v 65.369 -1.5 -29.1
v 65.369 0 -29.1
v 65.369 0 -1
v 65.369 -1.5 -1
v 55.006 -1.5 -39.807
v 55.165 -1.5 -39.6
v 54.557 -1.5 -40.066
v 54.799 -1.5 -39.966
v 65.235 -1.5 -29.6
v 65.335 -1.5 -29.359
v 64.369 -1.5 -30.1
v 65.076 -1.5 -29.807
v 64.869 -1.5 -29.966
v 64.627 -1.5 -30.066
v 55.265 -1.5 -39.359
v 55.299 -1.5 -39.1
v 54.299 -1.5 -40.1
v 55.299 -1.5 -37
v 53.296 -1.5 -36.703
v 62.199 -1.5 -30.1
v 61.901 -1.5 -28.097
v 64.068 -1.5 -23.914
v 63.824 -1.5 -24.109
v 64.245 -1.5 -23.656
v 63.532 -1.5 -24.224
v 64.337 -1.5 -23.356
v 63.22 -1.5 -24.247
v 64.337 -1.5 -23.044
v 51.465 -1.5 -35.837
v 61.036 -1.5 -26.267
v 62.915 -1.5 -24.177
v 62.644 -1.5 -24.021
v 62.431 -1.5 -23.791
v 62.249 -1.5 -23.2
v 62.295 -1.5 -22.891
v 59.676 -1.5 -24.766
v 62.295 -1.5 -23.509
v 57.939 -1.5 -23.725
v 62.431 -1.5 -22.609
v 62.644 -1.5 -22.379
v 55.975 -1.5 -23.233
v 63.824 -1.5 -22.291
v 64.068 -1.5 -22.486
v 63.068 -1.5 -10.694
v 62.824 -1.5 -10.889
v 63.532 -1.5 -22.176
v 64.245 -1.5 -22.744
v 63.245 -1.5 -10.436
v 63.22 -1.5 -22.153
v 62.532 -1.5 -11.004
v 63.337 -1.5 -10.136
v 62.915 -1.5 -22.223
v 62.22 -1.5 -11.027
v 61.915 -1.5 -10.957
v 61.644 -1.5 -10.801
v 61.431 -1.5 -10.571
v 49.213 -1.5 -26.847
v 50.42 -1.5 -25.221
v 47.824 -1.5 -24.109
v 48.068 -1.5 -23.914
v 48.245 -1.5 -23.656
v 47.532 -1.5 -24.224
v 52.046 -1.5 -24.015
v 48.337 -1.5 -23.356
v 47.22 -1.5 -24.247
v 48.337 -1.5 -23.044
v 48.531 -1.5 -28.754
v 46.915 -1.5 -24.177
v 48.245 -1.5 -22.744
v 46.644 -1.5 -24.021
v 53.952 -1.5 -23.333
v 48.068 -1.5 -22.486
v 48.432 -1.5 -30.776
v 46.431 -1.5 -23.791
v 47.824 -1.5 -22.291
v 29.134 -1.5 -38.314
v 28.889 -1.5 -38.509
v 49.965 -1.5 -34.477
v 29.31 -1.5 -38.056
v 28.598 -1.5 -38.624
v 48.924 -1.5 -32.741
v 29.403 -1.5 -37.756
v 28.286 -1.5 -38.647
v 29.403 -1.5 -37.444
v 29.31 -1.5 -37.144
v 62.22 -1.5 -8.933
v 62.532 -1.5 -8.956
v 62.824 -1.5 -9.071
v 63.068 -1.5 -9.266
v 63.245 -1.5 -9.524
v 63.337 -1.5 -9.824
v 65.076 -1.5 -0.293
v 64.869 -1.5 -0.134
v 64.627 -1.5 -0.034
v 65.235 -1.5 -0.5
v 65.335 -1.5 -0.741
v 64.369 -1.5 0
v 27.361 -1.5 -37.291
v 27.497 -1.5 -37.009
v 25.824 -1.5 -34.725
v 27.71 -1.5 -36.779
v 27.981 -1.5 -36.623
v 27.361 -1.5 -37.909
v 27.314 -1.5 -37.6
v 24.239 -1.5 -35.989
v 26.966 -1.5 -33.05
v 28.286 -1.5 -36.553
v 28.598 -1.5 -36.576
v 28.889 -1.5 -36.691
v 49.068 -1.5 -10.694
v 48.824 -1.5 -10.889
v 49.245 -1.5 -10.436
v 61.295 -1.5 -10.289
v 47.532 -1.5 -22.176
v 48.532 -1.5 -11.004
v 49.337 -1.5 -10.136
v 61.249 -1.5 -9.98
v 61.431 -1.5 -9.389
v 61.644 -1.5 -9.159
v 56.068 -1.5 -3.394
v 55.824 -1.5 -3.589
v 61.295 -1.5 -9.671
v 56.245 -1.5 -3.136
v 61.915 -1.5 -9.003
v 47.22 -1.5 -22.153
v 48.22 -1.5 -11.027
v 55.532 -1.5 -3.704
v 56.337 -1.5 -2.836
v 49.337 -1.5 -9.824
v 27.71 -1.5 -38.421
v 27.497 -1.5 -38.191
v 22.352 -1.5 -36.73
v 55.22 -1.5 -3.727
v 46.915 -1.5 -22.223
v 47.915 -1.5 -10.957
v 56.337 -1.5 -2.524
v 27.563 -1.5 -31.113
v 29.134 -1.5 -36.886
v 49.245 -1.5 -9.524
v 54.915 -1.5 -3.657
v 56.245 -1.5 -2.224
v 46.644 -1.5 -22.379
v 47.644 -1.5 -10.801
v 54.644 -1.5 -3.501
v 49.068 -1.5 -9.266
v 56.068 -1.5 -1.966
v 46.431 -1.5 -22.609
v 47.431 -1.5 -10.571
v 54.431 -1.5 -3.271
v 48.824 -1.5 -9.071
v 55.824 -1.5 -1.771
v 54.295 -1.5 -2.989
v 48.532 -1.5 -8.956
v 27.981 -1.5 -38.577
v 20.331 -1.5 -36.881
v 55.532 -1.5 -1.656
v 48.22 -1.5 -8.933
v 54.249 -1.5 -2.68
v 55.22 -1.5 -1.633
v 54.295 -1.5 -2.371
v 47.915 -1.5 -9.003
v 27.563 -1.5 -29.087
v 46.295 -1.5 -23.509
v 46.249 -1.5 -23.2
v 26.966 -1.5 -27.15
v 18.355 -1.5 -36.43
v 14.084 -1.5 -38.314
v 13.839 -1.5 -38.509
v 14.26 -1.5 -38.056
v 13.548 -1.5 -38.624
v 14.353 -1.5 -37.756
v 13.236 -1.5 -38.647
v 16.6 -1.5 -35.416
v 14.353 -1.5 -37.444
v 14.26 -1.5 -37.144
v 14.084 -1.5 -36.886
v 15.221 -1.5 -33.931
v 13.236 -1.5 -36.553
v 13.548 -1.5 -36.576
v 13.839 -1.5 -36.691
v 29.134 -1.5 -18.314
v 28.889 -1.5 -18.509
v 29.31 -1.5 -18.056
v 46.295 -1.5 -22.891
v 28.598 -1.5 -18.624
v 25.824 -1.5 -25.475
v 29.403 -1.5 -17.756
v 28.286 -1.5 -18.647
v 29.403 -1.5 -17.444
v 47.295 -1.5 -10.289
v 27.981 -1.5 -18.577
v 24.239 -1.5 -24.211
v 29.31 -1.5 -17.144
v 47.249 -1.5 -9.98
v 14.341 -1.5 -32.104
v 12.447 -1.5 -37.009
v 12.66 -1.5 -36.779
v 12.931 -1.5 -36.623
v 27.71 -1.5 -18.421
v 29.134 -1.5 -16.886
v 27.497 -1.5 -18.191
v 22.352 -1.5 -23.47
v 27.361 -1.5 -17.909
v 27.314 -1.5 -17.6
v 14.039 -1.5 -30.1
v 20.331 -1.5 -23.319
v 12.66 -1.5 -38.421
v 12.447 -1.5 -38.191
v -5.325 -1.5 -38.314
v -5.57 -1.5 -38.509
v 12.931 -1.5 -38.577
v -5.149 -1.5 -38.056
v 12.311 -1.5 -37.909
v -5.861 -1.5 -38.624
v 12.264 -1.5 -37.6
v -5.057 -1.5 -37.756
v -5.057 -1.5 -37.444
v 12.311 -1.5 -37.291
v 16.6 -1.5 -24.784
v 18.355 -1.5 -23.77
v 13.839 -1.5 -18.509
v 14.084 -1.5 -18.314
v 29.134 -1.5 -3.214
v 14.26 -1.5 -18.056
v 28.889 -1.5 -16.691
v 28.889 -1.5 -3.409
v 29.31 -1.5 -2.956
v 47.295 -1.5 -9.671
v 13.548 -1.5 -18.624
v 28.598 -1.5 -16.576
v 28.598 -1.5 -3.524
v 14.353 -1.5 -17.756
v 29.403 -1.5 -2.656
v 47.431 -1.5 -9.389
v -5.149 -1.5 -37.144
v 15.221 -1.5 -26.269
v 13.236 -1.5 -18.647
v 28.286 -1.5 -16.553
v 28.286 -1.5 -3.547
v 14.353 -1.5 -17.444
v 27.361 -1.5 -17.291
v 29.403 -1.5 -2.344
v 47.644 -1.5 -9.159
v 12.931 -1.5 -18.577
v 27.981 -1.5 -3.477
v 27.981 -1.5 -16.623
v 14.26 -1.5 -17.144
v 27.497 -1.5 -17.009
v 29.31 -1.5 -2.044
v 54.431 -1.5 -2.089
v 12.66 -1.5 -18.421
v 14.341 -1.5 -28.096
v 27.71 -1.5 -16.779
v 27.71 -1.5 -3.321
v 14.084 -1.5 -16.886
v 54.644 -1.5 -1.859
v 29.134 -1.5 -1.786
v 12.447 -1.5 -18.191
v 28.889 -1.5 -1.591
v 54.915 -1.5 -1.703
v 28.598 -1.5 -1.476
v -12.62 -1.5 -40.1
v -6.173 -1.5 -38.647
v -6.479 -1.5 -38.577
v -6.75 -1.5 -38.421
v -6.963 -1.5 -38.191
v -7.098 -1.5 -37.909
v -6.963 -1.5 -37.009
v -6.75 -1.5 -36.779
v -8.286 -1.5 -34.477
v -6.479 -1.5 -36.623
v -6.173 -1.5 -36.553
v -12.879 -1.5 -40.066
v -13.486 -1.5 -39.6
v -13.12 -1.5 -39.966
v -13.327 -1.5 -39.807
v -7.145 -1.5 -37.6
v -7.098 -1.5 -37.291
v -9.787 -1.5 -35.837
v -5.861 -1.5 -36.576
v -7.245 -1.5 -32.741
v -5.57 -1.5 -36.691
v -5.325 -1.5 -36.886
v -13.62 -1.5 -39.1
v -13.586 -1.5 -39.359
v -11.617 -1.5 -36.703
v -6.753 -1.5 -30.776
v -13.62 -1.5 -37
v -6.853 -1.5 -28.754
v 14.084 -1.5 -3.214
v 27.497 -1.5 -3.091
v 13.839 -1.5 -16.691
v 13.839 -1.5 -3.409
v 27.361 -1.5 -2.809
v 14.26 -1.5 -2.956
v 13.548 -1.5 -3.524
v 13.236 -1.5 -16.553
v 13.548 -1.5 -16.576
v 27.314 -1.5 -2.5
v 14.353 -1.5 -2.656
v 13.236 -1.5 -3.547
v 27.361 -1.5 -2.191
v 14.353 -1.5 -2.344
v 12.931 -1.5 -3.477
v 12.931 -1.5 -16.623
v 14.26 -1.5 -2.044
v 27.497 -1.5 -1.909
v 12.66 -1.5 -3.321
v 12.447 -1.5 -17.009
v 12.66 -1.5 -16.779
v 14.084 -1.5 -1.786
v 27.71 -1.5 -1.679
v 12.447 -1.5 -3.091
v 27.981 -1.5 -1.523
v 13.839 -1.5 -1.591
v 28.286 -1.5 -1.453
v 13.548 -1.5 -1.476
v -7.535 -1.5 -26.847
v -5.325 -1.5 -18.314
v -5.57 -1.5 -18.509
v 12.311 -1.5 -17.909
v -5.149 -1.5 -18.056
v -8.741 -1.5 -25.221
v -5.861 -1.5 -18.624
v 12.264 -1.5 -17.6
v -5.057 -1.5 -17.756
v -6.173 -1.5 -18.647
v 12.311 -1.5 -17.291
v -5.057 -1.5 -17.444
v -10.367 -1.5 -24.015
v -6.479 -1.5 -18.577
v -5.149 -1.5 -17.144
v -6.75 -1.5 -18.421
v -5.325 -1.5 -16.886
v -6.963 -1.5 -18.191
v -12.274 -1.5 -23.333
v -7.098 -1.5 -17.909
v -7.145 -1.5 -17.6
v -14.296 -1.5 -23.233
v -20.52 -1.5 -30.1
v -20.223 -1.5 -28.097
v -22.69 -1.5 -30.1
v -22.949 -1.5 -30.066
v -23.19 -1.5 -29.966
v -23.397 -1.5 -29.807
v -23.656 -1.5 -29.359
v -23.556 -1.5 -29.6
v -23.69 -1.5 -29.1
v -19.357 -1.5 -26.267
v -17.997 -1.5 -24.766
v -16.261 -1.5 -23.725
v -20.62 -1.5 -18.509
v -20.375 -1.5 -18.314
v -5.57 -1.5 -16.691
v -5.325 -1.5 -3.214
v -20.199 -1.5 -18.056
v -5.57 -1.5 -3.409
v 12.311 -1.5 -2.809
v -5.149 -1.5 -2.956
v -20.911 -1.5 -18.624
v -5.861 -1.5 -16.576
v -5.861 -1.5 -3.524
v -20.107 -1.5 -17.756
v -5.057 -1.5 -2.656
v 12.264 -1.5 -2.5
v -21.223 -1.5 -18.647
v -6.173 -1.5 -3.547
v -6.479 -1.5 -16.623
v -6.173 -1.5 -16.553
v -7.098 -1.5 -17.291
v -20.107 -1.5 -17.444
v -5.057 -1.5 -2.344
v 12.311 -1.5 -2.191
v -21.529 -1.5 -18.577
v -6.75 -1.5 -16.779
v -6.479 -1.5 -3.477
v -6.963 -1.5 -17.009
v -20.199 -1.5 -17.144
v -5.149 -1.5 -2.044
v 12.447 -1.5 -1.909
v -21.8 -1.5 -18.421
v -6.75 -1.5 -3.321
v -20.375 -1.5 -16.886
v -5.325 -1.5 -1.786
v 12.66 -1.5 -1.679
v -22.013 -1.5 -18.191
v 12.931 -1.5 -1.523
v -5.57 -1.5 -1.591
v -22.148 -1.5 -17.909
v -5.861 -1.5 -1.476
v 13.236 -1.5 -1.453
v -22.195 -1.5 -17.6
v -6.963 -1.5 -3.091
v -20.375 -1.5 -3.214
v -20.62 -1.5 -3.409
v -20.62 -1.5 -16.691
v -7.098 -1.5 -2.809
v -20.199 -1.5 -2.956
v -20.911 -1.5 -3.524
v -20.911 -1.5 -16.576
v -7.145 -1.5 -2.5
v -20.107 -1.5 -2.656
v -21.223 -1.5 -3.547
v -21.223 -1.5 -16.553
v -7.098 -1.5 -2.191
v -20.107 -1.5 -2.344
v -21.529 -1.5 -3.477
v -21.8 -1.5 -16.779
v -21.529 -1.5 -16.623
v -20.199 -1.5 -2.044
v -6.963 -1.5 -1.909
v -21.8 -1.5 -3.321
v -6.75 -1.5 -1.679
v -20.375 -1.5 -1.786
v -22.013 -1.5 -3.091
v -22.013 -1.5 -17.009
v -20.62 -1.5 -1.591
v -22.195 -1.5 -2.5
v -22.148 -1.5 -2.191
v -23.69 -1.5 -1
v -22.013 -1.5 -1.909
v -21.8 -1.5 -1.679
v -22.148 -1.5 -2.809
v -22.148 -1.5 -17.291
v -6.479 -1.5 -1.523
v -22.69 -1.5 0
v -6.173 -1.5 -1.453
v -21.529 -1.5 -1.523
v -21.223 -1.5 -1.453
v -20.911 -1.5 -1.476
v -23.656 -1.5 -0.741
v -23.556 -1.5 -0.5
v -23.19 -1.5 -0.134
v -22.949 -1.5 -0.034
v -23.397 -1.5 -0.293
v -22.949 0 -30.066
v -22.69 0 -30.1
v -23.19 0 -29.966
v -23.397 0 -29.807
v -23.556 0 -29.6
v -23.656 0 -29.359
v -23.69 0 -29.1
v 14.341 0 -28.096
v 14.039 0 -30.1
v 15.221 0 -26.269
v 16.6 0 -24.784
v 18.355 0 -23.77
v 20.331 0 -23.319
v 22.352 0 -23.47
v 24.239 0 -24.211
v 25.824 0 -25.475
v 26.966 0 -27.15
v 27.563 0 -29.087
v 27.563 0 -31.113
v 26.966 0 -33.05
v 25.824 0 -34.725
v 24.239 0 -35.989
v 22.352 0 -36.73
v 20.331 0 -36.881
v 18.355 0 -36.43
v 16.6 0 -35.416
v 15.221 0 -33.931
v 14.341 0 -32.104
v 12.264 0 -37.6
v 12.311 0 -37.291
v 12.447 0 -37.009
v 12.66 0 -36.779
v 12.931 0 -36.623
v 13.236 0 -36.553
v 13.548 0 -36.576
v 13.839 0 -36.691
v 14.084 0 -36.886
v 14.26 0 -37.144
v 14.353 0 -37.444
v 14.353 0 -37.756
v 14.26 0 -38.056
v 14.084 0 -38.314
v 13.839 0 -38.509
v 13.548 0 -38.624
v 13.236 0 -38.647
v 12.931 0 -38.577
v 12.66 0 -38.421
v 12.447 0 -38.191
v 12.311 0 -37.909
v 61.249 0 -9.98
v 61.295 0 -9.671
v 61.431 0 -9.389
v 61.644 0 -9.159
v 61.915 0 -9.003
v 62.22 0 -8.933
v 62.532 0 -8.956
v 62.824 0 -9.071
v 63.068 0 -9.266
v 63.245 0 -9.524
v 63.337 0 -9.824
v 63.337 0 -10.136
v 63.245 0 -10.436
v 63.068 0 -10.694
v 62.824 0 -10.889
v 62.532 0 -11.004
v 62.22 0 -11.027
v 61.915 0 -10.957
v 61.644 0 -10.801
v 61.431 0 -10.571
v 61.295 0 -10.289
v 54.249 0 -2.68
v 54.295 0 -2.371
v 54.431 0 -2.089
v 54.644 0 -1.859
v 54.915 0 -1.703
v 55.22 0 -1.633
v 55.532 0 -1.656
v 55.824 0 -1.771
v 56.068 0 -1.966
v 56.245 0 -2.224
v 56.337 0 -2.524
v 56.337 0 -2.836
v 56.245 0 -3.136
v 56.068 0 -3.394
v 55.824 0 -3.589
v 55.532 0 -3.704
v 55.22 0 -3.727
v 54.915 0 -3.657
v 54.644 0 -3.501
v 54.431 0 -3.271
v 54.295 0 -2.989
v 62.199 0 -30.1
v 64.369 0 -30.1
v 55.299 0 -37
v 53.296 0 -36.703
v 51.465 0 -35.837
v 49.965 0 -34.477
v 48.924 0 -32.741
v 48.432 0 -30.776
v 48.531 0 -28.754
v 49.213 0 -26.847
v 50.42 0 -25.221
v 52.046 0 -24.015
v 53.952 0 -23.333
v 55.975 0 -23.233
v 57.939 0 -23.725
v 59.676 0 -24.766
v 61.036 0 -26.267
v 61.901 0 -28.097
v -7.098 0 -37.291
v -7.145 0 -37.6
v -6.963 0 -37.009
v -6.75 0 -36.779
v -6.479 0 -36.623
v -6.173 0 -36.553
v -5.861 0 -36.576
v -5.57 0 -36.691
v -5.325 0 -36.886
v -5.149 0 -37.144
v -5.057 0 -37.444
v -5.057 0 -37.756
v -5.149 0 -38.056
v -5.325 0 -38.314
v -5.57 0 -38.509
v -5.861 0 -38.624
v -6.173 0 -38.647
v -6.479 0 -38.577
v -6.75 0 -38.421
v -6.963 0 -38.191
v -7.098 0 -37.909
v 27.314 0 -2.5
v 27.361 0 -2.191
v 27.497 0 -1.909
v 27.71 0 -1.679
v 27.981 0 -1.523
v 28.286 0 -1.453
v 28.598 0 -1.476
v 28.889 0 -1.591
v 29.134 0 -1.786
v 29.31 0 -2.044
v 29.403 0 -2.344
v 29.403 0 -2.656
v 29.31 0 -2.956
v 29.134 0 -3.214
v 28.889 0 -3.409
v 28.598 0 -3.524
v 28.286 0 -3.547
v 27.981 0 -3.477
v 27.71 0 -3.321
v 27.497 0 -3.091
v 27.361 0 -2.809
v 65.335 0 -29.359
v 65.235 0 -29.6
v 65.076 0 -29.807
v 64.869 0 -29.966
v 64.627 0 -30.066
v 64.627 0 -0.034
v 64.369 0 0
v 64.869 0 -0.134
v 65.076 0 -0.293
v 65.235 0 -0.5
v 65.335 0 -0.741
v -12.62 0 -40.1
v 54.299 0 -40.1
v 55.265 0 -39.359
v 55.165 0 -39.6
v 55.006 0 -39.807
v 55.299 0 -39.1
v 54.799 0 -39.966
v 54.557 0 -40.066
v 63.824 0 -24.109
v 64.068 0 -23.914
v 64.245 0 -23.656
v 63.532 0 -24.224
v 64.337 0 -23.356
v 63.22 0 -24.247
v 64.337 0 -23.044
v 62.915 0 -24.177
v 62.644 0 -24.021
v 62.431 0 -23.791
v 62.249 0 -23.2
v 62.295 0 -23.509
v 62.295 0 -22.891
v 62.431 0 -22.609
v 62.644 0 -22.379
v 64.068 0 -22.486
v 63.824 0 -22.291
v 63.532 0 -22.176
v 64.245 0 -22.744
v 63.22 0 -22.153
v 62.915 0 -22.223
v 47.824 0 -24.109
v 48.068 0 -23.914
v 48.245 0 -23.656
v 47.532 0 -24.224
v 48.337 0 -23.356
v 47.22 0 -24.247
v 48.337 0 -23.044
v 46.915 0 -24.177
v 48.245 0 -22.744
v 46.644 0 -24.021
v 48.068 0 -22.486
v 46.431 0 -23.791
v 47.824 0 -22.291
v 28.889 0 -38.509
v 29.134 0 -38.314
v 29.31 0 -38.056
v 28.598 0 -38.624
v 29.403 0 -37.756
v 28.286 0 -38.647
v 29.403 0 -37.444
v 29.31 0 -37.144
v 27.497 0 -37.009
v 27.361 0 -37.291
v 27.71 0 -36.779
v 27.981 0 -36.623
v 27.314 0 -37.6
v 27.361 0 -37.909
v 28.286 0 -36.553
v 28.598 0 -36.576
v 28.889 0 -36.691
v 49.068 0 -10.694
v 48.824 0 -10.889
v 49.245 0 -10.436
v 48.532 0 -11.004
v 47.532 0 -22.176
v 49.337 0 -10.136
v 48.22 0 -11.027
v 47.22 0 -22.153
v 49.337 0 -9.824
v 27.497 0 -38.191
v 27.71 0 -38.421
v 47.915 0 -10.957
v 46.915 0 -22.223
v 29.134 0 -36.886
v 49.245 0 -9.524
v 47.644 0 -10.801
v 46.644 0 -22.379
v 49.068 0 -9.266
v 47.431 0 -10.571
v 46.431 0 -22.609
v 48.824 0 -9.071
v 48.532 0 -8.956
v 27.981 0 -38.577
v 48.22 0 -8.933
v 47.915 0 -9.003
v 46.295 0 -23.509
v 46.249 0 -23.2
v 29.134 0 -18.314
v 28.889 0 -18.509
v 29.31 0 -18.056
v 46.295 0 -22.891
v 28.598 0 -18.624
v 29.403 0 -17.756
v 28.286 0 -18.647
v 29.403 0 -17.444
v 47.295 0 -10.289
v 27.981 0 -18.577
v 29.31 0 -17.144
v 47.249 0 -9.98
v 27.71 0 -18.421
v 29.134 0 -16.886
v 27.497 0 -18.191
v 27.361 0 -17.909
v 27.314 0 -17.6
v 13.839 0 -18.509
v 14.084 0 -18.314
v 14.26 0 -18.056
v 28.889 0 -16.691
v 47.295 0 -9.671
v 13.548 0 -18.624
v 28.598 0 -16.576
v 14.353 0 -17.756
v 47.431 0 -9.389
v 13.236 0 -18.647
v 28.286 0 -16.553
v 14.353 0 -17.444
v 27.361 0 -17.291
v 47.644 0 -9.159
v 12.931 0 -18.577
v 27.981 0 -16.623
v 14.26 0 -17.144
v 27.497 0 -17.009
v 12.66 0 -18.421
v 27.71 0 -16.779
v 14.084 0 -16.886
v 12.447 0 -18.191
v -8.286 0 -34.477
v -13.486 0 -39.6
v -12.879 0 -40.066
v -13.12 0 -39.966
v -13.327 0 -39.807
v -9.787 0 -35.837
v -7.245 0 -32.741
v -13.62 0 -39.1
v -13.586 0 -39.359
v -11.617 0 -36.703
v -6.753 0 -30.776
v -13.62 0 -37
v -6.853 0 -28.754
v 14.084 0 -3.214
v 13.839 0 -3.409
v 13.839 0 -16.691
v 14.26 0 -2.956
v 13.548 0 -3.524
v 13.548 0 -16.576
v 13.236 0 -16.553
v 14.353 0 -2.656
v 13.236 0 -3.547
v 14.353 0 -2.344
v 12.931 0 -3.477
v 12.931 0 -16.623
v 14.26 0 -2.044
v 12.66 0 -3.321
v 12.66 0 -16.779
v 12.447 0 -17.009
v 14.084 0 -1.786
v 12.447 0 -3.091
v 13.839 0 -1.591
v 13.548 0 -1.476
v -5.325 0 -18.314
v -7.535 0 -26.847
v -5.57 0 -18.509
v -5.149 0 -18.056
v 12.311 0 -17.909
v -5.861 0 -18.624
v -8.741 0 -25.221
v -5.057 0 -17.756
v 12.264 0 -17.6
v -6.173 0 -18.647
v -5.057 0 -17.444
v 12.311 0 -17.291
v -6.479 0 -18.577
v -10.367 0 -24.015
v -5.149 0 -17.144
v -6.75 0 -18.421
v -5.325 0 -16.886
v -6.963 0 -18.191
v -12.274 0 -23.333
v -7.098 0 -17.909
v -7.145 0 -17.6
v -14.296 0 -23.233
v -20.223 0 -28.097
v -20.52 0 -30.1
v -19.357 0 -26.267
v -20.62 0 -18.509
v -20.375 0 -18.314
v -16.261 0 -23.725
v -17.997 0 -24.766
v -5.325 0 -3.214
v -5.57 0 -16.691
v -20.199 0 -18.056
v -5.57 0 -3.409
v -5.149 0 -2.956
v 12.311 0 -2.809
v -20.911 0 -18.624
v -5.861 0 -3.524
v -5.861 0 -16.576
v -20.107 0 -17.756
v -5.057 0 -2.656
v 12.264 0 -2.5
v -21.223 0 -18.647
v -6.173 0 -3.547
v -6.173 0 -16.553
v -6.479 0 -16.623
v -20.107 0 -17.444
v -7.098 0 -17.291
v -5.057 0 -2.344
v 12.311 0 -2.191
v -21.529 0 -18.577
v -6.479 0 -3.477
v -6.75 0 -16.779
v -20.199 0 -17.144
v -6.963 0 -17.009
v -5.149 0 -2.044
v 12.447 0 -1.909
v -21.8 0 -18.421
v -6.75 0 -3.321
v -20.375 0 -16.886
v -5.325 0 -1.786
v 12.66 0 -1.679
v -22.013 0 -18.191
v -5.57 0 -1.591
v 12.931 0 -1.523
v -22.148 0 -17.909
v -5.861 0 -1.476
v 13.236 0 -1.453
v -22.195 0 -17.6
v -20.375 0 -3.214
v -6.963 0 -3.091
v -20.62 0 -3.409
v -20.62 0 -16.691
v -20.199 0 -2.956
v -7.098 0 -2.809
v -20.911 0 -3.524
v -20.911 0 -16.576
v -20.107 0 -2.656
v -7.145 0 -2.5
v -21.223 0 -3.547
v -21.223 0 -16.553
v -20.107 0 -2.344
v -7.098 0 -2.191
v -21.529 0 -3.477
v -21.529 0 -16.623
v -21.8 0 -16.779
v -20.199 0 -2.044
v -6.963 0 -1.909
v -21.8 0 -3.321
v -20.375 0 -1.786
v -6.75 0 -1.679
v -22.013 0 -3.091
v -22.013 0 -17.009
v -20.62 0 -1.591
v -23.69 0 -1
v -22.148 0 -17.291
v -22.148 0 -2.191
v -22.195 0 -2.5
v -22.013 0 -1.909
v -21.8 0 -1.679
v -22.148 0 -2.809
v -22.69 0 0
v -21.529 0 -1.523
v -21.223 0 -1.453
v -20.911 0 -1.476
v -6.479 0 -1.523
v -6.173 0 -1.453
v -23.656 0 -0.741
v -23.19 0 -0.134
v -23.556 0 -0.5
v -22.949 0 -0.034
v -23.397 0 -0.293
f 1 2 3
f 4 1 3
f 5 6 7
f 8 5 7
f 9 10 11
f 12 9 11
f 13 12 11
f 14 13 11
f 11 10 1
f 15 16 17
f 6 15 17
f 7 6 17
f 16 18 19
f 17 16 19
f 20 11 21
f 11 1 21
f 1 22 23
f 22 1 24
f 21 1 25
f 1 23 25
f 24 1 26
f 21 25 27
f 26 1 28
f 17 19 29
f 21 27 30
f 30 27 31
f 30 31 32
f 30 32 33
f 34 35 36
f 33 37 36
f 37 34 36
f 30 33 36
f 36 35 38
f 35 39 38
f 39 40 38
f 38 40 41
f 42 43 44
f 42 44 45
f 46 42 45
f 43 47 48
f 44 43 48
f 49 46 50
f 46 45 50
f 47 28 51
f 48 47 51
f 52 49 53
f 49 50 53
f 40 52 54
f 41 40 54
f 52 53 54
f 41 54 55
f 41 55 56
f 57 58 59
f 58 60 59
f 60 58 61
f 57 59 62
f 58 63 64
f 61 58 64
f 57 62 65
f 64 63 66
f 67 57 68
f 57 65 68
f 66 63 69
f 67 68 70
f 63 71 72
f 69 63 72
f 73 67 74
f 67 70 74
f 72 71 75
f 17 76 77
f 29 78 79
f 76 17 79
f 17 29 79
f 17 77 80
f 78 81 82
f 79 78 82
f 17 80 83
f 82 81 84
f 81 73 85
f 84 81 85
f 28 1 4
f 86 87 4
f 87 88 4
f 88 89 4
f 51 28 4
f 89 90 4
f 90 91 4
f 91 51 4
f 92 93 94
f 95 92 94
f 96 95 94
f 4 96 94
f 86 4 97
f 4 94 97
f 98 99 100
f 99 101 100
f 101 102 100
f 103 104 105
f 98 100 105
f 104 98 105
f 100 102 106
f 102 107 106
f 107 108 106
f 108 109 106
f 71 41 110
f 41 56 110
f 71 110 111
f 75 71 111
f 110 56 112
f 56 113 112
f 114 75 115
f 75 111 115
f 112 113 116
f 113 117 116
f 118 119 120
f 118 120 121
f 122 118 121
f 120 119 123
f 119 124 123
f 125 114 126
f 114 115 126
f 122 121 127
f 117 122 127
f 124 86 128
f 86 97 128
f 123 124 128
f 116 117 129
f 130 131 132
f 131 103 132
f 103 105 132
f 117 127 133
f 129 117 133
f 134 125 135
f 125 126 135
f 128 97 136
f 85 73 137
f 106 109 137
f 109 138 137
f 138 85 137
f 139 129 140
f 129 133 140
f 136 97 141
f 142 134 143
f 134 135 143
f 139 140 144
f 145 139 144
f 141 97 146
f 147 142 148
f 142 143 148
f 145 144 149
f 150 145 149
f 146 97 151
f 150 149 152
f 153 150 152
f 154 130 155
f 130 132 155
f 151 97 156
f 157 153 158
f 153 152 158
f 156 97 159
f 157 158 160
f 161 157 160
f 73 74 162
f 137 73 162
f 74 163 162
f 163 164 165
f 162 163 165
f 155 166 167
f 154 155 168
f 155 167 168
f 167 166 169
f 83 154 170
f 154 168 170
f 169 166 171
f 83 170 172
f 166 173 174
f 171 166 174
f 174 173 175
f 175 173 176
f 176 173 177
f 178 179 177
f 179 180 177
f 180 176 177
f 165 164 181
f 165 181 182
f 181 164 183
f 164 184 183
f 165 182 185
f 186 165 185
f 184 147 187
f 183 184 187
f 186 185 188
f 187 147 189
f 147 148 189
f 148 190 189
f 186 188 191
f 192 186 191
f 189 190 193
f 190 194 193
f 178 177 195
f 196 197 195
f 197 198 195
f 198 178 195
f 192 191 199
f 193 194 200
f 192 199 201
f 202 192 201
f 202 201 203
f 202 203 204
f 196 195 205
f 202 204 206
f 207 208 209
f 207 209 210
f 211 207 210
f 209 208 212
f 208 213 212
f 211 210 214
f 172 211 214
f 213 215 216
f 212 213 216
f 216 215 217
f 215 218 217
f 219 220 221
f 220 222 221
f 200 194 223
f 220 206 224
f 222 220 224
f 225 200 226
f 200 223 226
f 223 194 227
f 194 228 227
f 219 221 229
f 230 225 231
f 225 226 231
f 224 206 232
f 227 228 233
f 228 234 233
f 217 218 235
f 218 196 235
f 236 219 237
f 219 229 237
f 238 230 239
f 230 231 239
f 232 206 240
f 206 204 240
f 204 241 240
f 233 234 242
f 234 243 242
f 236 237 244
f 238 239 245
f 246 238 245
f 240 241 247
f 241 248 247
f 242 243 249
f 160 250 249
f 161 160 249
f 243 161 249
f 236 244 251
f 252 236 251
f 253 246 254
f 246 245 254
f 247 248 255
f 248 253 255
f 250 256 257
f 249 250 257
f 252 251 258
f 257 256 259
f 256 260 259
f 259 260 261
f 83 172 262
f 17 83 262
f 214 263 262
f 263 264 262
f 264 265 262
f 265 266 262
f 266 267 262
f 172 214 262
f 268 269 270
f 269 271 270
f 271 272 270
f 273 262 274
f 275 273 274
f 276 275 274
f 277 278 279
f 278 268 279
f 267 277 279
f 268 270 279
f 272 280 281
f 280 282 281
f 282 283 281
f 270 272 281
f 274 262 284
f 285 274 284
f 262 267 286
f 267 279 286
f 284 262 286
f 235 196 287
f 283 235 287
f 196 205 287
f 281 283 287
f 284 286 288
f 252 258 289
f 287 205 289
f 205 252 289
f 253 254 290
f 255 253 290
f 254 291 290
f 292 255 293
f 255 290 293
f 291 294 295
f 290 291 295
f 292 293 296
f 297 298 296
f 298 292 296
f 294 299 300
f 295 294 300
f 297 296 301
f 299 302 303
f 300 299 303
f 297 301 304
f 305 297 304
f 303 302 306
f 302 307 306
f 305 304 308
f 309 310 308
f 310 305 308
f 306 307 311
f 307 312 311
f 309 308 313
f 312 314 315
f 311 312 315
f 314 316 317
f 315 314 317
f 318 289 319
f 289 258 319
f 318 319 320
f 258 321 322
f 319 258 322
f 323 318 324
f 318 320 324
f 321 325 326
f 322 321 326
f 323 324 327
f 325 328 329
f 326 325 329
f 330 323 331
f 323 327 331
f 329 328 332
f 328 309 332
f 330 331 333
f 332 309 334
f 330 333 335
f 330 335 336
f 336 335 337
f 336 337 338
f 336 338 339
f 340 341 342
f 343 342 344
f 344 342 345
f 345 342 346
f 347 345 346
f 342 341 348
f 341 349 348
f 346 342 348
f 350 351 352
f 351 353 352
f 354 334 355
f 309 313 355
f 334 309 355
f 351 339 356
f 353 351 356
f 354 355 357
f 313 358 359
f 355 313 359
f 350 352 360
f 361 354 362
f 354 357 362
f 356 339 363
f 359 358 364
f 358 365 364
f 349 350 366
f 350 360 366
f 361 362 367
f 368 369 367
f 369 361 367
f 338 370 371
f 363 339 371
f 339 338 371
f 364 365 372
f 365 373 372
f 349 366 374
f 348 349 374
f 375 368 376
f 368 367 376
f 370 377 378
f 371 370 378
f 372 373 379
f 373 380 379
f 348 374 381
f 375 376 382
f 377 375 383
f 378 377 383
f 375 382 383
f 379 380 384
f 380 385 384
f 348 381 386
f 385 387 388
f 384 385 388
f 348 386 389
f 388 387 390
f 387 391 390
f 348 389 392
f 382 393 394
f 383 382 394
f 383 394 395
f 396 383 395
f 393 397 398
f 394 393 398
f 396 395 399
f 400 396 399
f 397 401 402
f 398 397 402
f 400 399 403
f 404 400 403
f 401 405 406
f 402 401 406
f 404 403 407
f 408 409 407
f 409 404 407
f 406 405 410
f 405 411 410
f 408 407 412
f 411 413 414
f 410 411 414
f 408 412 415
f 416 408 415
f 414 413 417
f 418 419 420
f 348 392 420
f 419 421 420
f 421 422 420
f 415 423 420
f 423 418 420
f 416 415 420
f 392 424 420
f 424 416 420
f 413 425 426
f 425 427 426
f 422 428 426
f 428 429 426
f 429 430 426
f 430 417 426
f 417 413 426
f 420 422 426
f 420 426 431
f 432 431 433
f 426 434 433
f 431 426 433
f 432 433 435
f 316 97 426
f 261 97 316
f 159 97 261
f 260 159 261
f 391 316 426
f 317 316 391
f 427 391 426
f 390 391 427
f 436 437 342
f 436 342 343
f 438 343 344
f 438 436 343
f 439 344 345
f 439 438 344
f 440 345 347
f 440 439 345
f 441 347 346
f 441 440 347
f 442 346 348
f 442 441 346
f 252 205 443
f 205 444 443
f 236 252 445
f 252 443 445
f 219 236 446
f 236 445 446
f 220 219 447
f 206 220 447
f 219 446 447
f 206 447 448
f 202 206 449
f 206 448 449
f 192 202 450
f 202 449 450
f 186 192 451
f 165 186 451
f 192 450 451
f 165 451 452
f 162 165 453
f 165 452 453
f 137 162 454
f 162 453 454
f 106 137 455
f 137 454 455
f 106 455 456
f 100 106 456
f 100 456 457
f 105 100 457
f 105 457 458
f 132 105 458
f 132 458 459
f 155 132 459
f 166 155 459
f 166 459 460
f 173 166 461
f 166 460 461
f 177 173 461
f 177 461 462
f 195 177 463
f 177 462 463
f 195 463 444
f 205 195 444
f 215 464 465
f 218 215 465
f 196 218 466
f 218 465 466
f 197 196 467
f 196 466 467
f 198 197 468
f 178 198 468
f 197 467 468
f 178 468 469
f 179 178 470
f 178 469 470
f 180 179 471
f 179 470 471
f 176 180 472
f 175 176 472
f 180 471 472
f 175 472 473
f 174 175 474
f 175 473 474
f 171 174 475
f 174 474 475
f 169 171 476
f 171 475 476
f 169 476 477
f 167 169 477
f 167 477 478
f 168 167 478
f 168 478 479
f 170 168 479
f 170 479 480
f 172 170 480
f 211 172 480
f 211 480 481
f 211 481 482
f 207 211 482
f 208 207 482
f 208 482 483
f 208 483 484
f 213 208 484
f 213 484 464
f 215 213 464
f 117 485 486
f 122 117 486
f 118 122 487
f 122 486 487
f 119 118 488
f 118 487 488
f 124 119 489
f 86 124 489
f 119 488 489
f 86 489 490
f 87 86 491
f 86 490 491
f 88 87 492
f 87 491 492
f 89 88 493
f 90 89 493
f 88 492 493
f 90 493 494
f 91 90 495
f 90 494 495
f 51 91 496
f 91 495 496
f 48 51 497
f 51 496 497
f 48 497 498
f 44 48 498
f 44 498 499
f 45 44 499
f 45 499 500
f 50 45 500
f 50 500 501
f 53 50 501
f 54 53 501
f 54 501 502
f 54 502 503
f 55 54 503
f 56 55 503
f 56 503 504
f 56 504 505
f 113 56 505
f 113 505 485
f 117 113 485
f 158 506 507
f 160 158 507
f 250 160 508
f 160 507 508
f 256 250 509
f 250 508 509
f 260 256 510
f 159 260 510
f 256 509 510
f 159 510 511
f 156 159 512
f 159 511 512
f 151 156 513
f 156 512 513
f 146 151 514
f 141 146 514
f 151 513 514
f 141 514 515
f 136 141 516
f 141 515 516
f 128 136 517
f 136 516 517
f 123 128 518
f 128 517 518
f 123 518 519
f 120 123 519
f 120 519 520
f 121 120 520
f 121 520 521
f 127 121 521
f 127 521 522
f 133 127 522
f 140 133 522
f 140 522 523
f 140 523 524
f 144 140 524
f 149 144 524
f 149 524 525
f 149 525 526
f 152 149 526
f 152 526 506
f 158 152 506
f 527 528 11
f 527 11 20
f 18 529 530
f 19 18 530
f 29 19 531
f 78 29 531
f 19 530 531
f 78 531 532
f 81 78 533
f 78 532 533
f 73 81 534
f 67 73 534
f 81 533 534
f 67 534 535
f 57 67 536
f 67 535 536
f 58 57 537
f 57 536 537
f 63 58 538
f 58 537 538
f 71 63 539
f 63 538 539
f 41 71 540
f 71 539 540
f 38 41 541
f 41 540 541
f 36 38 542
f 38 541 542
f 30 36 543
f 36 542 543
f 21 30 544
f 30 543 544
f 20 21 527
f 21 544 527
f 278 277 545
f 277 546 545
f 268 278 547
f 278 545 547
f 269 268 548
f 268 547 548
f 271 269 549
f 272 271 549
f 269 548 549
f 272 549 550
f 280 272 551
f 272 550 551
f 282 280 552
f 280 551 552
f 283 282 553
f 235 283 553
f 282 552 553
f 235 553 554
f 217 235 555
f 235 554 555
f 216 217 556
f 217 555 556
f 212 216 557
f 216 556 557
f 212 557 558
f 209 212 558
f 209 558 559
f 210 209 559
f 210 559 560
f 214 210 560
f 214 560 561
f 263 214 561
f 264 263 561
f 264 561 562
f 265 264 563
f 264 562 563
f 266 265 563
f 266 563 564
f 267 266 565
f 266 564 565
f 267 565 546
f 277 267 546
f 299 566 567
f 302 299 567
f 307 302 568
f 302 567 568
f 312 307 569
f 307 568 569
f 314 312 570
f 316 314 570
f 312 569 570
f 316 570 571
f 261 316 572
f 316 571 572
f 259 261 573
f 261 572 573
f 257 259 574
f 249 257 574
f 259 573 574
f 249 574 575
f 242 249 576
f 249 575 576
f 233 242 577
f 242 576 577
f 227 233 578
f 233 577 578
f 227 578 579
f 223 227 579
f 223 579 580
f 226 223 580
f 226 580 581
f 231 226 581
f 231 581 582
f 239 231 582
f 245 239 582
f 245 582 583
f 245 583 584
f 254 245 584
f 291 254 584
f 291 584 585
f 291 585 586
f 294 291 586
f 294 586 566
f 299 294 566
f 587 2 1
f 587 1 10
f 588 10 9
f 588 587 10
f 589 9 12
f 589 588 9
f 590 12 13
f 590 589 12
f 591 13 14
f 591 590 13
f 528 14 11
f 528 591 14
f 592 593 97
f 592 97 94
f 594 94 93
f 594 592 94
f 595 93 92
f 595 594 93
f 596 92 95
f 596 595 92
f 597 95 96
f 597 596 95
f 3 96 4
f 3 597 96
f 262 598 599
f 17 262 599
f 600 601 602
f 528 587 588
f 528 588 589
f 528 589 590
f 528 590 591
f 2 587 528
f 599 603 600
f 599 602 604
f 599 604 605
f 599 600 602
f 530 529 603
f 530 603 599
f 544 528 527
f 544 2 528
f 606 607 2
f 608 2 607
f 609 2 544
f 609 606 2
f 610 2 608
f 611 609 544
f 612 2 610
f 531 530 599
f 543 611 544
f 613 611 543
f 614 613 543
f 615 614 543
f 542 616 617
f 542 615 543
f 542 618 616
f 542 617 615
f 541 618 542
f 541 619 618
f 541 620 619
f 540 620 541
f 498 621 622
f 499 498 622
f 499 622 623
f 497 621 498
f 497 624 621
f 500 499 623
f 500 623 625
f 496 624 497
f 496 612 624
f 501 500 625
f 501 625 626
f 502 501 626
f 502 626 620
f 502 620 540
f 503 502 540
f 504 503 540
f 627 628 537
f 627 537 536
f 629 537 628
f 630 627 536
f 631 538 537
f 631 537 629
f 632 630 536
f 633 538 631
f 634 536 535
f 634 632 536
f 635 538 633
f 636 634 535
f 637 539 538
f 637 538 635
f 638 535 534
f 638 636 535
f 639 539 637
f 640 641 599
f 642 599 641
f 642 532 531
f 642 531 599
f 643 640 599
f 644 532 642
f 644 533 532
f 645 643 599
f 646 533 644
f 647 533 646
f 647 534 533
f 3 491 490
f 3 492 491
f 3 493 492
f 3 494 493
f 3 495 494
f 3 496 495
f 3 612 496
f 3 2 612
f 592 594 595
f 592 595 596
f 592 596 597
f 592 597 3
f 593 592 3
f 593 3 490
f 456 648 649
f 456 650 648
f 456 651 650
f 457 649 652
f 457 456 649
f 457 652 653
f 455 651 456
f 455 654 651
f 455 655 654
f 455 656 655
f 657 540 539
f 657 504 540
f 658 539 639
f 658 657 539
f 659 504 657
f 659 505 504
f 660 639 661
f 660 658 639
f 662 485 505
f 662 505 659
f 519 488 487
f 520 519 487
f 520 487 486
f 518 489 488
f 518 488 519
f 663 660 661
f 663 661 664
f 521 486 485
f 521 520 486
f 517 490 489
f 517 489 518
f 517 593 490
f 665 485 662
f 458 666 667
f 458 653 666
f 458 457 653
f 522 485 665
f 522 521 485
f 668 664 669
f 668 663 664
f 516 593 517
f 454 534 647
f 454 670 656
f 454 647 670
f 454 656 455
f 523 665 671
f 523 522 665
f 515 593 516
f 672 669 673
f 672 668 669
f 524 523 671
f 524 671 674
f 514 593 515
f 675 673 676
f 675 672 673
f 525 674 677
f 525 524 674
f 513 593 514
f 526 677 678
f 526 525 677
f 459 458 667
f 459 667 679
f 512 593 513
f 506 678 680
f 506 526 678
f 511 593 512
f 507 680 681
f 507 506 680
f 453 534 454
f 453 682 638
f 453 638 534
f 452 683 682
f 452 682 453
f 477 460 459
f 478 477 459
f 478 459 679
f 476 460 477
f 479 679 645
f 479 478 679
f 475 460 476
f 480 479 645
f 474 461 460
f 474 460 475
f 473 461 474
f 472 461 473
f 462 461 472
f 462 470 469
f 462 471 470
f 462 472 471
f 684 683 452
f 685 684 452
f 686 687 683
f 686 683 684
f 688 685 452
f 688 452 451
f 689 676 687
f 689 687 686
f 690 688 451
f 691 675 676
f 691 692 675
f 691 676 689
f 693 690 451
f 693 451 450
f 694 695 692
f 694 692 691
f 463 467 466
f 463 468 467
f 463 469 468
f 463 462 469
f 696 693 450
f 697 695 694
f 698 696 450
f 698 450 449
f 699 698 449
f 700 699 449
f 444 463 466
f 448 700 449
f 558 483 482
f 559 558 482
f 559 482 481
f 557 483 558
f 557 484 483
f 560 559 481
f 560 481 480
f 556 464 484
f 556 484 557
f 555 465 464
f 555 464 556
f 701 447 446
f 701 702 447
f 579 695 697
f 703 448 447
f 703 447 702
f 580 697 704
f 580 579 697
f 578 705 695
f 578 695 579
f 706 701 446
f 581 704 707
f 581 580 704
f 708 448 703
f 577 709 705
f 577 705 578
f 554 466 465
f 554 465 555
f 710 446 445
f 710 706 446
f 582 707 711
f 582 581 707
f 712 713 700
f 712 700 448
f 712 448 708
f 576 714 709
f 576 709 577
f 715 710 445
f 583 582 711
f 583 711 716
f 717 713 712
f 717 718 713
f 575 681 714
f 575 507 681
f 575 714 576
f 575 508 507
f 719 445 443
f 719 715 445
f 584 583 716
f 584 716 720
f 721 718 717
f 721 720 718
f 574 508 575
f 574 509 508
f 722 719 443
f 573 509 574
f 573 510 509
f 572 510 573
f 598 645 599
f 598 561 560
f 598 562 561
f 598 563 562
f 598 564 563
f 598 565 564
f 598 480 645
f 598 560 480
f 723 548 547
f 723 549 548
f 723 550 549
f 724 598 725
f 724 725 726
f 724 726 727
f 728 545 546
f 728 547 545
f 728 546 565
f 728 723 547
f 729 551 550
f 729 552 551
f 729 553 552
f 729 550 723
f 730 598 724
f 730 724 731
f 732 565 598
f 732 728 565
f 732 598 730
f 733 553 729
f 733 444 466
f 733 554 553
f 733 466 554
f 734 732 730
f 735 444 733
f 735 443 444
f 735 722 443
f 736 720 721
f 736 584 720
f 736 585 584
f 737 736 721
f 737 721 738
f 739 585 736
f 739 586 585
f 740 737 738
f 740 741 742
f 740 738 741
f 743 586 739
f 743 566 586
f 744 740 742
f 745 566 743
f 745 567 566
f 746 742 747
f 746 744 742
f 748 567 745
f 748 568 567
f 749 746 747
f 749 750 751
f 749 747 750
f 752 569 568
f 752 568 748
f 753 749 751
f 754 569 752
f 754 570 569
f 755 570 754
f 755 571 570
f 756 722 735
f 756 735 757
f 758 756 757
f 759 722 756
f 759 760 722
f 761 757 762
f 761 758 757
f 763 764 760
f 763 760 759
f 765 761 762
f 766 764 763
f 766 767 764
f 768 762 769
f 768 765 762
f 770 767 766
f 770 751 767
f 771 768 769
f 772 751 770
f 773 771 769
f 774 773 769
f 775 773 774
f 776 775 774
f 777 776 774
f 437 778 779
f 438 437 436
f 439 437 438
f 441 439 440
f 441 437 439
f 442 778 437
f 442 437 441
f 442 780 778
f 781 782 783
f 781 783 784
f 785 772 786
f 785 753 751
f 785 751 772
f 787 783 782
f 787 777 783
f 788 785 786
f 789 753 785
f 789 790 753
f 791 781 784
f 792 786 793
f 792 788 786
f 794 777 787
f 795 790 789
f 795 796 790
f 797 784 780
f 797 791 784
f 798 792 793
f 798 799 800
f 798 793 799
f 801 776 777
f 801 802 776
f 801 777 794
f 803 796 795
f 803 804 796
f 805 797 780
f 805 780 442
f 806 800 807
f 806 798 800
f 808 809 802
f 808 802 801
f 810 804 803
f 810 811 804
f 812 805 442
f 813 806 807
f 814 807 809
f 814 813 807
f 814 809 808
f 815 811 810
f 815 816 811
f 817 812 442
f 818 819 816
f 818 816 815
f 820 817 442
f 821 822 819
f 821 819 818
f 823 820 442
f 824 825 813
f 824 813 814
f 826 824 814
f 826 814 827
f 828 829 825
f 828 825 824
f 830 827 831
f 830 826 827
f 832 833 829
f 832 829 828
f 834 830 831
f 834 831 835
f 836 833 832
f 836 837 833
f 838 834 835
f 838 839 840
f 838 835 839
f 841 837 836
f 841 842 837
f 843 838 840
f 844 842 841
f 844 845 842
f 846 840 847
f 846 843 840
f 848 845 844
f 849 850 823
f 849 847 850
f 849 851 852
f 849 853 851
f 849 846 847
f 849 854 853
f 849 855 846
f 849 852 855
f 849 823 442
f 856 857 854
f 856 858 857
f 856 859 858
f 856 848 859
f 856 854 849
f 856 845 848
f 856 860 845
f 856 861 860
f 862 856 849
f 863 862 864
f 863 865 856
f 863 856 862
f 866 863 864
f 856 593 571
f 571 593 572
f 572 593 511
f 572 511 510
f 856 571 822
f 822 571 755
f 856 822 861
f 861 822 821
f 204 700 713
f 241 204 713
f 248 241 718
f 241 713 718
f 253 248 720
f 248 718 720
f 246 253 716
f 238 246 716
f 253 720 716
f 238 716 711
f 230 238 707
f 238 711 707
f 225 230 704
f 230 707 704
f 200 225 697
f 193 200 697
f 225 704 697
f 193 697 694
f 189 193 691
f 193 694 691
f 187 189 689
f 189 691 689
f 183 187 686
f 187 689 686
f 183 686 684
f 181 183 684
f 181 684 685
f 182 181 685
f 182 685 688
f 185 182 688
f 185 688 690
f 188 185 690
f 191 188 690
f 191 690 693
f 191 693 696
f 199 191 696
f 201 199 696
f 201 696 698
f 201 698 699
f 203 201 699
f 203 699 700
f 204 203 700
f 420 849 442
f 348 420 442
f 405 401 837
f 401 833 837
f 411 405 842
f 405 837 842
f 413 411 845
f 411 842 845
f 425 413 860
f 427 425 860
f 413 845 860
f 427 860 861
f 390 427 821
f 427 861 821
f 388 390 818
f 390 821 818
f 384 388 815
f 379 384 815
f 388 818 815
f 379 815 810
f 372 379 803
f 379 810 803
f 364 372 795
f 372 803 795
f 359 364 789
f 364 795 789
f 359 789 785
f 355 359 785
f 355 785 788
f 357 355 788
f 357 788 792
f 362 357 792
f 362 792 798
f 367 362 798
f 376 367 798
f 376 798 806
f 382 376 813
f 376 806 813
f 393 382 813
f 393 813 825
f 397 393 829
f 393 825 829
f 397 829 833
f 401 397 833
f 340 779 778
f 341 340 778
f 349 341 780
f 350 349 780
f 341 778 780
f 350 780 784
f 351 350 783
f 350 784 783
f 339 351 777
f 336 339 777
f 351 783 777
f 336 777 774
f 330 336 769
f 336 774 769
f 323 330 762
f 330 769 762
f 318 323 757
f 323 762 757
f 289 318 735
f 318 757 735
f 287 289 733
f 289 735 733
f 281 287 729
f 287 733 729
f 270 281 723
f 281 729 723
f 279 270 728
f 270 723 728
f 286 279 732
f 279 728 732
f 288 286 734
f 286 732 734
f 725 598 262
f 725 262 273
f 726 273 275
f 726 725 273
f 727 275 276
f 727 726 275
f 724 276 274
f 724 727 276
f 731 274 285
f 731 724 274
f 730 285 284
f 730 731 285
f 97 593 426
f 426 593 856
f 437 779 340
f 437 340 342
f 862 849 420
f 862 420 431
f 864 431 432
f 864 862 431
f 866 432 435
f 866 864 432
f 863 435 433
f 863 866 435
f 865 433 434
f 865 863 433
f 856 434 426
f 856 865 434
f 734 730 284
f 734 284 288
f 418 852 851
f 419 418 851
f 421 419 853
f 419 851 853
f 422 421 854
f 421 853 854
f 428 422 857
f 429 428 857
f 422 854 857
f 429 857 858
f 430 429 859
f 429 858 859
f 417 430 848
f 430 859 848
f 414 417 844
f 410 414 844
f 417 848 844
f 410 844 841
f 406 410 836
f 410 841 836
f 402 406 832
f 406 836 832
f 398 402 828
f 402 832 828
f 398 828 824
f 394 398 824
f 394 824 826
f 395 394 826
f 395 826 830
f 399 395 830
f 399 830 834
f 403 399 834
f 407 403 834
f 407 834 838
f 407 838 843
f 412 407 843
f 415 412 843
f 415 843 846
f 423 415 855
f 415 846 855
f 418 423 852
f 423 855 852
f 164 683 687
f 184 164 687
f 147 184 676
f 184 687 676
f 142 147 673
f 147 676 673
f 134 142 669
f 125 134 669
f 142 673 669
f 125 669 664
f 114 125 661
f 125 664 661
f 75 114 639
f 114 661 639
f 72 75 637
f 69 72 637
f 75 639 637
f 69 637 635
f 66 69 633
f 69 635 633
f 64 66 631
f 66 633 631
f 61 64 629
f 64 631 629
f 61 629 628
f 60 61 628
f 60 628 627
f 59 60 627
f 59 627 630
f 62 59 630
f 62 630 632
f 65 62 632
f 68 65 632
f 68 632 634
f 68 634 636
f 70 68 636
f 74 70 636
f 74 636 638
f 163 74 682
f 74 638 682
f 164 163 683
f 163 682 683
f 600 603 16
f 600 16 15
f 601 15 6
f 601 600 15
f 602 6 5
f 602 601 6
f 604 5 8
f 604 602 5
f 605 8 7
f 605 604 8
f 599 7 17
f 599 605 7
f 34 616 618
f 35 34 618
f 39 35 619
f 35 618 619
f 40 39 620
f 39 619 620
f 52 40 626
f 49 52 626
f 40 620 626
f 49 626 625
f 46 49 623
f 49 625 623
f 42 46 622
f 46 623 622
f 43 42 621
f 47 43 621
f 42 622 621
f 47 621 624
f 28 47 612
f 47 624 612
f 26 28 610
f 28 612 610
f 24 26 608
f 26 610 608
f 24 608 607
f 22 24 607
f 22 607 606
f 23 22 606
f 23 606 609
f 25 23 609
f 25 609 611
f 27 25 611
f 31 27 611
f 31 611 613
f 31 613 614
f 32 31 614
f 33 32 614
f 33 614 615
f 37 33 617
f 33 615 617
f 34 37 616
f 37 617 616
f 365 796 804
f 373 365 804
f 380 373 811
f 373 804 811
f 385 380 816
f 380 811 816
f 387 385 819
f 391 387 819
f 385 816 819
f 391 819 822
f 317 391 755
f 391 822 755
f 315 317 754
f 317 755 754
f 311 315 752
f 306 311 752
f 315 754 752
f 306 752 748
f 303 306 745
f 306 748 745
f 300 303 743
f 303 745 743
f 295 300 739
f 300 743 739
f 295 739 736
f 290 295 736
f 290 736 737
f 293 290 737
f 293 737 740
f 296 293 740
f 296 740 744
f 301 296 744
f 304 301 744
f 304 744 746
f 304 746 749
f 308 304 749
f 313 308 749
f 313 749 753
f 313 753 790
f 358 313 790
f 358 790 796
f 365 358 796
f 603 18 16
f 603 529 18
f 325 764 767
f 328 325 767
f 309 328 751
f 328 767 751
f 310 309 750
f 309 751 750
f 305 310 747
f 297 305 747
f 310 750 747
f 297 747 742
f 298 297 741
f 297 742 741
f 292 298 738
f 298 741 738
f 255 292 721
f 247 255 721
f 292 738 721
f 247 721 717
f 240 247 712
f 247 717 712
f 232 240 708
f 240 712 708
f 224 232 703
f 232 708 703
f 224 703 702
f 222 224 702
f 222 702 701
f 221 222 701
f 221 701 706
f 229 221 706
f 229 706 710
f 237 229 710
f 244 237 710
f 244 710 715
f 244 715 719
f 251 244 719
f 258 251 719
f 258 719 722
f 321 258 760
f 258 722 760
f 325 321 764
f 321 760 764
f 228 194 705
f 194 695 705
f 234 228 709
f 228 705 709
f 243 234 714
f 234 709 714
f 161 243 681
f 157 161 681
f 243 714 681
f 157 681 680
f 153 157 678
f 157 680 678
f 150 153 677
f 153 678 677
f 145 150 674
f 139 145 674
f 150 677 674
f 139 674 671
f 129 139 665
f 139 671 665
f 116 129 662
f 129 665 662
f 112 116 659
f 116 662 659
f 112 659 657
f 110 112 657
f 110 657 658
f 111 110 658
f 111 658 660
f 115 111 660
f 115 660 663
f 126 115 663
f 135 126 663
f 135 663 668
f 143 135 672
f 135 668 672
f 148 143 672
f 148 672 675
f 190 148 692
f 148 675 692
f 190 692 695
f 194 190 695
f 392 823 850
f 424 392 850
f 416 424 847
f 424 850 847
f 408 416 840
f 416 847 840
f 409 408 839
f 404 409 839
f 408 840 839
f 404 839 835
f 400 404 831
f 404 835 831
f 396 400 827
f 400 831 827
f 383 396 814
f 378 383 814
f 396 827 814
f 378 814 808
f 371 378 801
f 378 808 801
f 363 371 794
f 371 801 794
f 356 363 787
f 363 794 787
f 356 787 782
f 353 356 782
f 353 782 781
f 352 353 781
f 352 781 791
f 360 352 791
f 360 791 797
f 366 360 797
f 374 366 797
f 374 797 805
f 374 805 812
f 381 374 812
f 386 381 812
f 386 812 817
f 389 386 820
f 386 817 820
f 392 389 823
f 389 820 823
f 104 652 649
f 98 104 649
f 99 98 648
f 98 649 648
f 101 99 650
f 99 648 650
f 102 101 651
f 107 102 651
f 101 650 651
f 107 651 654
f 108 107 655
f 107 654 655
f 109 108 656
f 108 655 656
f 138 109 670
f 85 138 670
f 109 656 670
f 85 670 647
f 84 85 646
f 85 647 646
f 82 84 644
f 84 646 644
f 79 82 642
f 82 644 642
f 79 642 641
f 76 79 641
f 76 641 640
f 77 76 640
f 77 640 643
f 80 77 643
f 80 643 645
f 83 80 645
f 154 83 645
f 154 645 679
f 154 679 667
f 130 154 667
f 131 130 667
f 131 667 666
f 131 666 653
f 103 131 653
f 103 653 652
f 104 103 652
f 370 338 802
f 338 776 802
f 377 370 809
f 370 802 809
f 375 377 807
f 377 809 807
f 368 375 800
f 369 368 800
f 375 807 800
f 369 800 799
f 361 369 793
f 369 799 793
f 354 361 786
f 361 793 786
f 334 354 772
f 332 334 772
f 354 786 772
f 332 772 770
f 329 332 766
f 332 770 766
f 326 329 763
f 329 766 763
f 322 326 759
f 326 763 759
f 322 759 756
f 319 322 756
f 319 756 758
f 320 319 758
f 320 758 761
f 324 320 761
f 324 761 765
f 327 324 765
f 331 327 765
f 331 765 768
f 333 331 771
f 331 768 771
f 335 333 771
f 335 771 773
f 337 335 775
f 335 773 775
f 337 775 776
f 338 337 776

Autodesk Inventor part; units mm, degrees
ref_plane "YZ Plane" through (0, 0, 0) normal (1, 0, 0) x (0, 1, 0)
ref_plane "XZ Plane" through (0, 0, 0) normal (0, 1, 0) x (-1, 0, 0)
ref_plane "XY Plane" through (0, 0, 0) normal (0, 0, 1) x (1, 0, 0)
sketch "Sketch1" plane through (0, 0, 0) normal (0, 1, 0) x (-1, 0, 0)
  line L0 (-0.4496, -40.1) -> (-0.4496, 0)
  line L1 (-41.2289, 0) -> (-41.2289, -40.1)
  circle A0 centre (-20.8393, -30.1) radius 6.8
  circle A1 centre (-13.3143, -37.6) radius 1.05
  circle A2 centre (-28.3643, -37.6) radius 1.05
  circle A3 centre (-13.3143, -17.6) radius 1.05
  circle A4 centre (-28.3643, -17.6) radius 1.05
  circle A5 centre (-13.3143, -2.5) radius 1.05
  circle A6 centre (-28.3643, -2.5) radius 1.05
  circle A7 centre (6.095, -37.6) radius 1.05
  circle A8 centre (21.145, -17.6) radius 1.05
  circle A9 centre (6.095, -17.6) radius 1.05
  circle A10 centre (21.145, -2.5) radius 1.05
  circle A11 centre (6.095, -2.5) radius 1.05
  circle A12 centre (-47.2986, -23.2) radius 1.05
  circle A13 centre (-63.2986, -23.2) radius 1.05
  circle A14 centre (-48.2986, -9.98) radius 1.05
  circle A15 centre (-62.2986, -9.98) radius 1.05
  circle A16 centre (-55.2986, -2.68) radius 1.05
  arc A17 (23.69, -1) -> (22.69, 0) centre (22.69, -1) ccw
  arc A18 (-64.3686, 0) -> (-65.3686, -1) centre (-64.3686, -1) ccw
  line L2 (-65.3686, -29.1) -> (-65.3686, -1)
  arc A19 (-65.3686, -29.1) -> (-64.3686, -30.1) centre (-64.3686, -29.1) ccw
  line L3 (-64.3686, -30.1) -> (-62.1986, -30.1)
  arc A20 (-55.2986, -39.1) -> (-54.2986, -40.1) centre (-54.2986, -39.1) ccw
  line L4 (-55.2986, -37) -> (-55.2986, -39.1)
  arc A21 (22.69, -30.1) -> (23.69, -29.1) centre (22.69, -29.1) ccw
  line L5 (20.52, -30.1) -> (22.69, -30.1)
  arc A22 (12.62, -40.1) -> (13.62, -39.1) centre (12.62, -39.1) ccw
  line L6 (13.62, -39.1) -> (13.62, -37)
  arc A23 (20.52, -30.1) -> (13.62, -37) centre (13.62, -30.1) ccw
  arc A24 (-55.2986, -37) -> (-62.1986, -30.1) centre (-55.2986, -30.1) ccw
  line L7 (23.69, -1) -> (23.69, -29.1)
  line L8 (-64.3686, 0) -> (22.69, 0)
  line L9 (12.62, -40.1) -> (-54.2986, -40.1)
  line L10 (-41.6786, -40.1) -> (-41.6786, 0)
  line L11 (-40.7793, 0) -> (-40.7793, -40.1)
  line L12 (-0.8993, -40.1) -> (-0.8993, 0)
  line L13 (0, 0) -> (0, -40.1)
  point P0 (0, 0)
extrude "Extrusion1" add sketch "Sketch1" against normal blind 1.5
properties part number "axis_5_top_frame" material "Aluminum 6061-AHC"
